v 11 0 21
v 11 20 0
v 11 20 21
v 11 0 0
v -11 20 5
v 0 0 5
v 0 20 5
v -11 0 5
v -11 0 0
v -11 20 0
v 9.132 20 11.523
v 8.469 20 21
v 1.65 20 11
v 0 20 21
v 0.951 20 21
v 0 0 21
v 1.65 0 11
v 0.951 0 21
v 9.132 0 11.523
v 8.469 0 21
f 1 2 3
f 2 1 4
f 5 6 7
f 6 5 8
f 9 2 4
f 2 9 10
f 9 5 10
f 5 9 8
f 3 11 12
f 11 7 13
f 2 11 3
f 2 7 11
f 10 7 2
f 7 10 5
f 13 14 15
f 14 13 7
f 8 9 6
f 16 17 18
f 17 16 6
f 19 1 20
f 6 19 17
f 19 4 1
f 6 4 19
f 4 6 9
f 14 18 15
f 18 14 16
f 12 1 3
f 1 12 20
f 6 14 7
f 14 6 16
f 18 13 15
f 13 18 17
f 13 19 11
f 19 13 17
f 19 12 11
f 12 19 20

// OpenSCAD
base_height = 21;
width = 11;
base_thickness = 20;
notch_thickness = 7.5;
F = 0.01;

difference() {
  union() {
    translate([-width, 0, 0])
      cube([2 * width, base_thickness, 5]);
    cube([width, base_thickness, base_height]);
  }

  translate([width * 0.15, -F, base_height - 10])
    rotate([0, -4, 0])
    cube([notch_thickness, base_thickness + 2 * F, base_height]);
}
